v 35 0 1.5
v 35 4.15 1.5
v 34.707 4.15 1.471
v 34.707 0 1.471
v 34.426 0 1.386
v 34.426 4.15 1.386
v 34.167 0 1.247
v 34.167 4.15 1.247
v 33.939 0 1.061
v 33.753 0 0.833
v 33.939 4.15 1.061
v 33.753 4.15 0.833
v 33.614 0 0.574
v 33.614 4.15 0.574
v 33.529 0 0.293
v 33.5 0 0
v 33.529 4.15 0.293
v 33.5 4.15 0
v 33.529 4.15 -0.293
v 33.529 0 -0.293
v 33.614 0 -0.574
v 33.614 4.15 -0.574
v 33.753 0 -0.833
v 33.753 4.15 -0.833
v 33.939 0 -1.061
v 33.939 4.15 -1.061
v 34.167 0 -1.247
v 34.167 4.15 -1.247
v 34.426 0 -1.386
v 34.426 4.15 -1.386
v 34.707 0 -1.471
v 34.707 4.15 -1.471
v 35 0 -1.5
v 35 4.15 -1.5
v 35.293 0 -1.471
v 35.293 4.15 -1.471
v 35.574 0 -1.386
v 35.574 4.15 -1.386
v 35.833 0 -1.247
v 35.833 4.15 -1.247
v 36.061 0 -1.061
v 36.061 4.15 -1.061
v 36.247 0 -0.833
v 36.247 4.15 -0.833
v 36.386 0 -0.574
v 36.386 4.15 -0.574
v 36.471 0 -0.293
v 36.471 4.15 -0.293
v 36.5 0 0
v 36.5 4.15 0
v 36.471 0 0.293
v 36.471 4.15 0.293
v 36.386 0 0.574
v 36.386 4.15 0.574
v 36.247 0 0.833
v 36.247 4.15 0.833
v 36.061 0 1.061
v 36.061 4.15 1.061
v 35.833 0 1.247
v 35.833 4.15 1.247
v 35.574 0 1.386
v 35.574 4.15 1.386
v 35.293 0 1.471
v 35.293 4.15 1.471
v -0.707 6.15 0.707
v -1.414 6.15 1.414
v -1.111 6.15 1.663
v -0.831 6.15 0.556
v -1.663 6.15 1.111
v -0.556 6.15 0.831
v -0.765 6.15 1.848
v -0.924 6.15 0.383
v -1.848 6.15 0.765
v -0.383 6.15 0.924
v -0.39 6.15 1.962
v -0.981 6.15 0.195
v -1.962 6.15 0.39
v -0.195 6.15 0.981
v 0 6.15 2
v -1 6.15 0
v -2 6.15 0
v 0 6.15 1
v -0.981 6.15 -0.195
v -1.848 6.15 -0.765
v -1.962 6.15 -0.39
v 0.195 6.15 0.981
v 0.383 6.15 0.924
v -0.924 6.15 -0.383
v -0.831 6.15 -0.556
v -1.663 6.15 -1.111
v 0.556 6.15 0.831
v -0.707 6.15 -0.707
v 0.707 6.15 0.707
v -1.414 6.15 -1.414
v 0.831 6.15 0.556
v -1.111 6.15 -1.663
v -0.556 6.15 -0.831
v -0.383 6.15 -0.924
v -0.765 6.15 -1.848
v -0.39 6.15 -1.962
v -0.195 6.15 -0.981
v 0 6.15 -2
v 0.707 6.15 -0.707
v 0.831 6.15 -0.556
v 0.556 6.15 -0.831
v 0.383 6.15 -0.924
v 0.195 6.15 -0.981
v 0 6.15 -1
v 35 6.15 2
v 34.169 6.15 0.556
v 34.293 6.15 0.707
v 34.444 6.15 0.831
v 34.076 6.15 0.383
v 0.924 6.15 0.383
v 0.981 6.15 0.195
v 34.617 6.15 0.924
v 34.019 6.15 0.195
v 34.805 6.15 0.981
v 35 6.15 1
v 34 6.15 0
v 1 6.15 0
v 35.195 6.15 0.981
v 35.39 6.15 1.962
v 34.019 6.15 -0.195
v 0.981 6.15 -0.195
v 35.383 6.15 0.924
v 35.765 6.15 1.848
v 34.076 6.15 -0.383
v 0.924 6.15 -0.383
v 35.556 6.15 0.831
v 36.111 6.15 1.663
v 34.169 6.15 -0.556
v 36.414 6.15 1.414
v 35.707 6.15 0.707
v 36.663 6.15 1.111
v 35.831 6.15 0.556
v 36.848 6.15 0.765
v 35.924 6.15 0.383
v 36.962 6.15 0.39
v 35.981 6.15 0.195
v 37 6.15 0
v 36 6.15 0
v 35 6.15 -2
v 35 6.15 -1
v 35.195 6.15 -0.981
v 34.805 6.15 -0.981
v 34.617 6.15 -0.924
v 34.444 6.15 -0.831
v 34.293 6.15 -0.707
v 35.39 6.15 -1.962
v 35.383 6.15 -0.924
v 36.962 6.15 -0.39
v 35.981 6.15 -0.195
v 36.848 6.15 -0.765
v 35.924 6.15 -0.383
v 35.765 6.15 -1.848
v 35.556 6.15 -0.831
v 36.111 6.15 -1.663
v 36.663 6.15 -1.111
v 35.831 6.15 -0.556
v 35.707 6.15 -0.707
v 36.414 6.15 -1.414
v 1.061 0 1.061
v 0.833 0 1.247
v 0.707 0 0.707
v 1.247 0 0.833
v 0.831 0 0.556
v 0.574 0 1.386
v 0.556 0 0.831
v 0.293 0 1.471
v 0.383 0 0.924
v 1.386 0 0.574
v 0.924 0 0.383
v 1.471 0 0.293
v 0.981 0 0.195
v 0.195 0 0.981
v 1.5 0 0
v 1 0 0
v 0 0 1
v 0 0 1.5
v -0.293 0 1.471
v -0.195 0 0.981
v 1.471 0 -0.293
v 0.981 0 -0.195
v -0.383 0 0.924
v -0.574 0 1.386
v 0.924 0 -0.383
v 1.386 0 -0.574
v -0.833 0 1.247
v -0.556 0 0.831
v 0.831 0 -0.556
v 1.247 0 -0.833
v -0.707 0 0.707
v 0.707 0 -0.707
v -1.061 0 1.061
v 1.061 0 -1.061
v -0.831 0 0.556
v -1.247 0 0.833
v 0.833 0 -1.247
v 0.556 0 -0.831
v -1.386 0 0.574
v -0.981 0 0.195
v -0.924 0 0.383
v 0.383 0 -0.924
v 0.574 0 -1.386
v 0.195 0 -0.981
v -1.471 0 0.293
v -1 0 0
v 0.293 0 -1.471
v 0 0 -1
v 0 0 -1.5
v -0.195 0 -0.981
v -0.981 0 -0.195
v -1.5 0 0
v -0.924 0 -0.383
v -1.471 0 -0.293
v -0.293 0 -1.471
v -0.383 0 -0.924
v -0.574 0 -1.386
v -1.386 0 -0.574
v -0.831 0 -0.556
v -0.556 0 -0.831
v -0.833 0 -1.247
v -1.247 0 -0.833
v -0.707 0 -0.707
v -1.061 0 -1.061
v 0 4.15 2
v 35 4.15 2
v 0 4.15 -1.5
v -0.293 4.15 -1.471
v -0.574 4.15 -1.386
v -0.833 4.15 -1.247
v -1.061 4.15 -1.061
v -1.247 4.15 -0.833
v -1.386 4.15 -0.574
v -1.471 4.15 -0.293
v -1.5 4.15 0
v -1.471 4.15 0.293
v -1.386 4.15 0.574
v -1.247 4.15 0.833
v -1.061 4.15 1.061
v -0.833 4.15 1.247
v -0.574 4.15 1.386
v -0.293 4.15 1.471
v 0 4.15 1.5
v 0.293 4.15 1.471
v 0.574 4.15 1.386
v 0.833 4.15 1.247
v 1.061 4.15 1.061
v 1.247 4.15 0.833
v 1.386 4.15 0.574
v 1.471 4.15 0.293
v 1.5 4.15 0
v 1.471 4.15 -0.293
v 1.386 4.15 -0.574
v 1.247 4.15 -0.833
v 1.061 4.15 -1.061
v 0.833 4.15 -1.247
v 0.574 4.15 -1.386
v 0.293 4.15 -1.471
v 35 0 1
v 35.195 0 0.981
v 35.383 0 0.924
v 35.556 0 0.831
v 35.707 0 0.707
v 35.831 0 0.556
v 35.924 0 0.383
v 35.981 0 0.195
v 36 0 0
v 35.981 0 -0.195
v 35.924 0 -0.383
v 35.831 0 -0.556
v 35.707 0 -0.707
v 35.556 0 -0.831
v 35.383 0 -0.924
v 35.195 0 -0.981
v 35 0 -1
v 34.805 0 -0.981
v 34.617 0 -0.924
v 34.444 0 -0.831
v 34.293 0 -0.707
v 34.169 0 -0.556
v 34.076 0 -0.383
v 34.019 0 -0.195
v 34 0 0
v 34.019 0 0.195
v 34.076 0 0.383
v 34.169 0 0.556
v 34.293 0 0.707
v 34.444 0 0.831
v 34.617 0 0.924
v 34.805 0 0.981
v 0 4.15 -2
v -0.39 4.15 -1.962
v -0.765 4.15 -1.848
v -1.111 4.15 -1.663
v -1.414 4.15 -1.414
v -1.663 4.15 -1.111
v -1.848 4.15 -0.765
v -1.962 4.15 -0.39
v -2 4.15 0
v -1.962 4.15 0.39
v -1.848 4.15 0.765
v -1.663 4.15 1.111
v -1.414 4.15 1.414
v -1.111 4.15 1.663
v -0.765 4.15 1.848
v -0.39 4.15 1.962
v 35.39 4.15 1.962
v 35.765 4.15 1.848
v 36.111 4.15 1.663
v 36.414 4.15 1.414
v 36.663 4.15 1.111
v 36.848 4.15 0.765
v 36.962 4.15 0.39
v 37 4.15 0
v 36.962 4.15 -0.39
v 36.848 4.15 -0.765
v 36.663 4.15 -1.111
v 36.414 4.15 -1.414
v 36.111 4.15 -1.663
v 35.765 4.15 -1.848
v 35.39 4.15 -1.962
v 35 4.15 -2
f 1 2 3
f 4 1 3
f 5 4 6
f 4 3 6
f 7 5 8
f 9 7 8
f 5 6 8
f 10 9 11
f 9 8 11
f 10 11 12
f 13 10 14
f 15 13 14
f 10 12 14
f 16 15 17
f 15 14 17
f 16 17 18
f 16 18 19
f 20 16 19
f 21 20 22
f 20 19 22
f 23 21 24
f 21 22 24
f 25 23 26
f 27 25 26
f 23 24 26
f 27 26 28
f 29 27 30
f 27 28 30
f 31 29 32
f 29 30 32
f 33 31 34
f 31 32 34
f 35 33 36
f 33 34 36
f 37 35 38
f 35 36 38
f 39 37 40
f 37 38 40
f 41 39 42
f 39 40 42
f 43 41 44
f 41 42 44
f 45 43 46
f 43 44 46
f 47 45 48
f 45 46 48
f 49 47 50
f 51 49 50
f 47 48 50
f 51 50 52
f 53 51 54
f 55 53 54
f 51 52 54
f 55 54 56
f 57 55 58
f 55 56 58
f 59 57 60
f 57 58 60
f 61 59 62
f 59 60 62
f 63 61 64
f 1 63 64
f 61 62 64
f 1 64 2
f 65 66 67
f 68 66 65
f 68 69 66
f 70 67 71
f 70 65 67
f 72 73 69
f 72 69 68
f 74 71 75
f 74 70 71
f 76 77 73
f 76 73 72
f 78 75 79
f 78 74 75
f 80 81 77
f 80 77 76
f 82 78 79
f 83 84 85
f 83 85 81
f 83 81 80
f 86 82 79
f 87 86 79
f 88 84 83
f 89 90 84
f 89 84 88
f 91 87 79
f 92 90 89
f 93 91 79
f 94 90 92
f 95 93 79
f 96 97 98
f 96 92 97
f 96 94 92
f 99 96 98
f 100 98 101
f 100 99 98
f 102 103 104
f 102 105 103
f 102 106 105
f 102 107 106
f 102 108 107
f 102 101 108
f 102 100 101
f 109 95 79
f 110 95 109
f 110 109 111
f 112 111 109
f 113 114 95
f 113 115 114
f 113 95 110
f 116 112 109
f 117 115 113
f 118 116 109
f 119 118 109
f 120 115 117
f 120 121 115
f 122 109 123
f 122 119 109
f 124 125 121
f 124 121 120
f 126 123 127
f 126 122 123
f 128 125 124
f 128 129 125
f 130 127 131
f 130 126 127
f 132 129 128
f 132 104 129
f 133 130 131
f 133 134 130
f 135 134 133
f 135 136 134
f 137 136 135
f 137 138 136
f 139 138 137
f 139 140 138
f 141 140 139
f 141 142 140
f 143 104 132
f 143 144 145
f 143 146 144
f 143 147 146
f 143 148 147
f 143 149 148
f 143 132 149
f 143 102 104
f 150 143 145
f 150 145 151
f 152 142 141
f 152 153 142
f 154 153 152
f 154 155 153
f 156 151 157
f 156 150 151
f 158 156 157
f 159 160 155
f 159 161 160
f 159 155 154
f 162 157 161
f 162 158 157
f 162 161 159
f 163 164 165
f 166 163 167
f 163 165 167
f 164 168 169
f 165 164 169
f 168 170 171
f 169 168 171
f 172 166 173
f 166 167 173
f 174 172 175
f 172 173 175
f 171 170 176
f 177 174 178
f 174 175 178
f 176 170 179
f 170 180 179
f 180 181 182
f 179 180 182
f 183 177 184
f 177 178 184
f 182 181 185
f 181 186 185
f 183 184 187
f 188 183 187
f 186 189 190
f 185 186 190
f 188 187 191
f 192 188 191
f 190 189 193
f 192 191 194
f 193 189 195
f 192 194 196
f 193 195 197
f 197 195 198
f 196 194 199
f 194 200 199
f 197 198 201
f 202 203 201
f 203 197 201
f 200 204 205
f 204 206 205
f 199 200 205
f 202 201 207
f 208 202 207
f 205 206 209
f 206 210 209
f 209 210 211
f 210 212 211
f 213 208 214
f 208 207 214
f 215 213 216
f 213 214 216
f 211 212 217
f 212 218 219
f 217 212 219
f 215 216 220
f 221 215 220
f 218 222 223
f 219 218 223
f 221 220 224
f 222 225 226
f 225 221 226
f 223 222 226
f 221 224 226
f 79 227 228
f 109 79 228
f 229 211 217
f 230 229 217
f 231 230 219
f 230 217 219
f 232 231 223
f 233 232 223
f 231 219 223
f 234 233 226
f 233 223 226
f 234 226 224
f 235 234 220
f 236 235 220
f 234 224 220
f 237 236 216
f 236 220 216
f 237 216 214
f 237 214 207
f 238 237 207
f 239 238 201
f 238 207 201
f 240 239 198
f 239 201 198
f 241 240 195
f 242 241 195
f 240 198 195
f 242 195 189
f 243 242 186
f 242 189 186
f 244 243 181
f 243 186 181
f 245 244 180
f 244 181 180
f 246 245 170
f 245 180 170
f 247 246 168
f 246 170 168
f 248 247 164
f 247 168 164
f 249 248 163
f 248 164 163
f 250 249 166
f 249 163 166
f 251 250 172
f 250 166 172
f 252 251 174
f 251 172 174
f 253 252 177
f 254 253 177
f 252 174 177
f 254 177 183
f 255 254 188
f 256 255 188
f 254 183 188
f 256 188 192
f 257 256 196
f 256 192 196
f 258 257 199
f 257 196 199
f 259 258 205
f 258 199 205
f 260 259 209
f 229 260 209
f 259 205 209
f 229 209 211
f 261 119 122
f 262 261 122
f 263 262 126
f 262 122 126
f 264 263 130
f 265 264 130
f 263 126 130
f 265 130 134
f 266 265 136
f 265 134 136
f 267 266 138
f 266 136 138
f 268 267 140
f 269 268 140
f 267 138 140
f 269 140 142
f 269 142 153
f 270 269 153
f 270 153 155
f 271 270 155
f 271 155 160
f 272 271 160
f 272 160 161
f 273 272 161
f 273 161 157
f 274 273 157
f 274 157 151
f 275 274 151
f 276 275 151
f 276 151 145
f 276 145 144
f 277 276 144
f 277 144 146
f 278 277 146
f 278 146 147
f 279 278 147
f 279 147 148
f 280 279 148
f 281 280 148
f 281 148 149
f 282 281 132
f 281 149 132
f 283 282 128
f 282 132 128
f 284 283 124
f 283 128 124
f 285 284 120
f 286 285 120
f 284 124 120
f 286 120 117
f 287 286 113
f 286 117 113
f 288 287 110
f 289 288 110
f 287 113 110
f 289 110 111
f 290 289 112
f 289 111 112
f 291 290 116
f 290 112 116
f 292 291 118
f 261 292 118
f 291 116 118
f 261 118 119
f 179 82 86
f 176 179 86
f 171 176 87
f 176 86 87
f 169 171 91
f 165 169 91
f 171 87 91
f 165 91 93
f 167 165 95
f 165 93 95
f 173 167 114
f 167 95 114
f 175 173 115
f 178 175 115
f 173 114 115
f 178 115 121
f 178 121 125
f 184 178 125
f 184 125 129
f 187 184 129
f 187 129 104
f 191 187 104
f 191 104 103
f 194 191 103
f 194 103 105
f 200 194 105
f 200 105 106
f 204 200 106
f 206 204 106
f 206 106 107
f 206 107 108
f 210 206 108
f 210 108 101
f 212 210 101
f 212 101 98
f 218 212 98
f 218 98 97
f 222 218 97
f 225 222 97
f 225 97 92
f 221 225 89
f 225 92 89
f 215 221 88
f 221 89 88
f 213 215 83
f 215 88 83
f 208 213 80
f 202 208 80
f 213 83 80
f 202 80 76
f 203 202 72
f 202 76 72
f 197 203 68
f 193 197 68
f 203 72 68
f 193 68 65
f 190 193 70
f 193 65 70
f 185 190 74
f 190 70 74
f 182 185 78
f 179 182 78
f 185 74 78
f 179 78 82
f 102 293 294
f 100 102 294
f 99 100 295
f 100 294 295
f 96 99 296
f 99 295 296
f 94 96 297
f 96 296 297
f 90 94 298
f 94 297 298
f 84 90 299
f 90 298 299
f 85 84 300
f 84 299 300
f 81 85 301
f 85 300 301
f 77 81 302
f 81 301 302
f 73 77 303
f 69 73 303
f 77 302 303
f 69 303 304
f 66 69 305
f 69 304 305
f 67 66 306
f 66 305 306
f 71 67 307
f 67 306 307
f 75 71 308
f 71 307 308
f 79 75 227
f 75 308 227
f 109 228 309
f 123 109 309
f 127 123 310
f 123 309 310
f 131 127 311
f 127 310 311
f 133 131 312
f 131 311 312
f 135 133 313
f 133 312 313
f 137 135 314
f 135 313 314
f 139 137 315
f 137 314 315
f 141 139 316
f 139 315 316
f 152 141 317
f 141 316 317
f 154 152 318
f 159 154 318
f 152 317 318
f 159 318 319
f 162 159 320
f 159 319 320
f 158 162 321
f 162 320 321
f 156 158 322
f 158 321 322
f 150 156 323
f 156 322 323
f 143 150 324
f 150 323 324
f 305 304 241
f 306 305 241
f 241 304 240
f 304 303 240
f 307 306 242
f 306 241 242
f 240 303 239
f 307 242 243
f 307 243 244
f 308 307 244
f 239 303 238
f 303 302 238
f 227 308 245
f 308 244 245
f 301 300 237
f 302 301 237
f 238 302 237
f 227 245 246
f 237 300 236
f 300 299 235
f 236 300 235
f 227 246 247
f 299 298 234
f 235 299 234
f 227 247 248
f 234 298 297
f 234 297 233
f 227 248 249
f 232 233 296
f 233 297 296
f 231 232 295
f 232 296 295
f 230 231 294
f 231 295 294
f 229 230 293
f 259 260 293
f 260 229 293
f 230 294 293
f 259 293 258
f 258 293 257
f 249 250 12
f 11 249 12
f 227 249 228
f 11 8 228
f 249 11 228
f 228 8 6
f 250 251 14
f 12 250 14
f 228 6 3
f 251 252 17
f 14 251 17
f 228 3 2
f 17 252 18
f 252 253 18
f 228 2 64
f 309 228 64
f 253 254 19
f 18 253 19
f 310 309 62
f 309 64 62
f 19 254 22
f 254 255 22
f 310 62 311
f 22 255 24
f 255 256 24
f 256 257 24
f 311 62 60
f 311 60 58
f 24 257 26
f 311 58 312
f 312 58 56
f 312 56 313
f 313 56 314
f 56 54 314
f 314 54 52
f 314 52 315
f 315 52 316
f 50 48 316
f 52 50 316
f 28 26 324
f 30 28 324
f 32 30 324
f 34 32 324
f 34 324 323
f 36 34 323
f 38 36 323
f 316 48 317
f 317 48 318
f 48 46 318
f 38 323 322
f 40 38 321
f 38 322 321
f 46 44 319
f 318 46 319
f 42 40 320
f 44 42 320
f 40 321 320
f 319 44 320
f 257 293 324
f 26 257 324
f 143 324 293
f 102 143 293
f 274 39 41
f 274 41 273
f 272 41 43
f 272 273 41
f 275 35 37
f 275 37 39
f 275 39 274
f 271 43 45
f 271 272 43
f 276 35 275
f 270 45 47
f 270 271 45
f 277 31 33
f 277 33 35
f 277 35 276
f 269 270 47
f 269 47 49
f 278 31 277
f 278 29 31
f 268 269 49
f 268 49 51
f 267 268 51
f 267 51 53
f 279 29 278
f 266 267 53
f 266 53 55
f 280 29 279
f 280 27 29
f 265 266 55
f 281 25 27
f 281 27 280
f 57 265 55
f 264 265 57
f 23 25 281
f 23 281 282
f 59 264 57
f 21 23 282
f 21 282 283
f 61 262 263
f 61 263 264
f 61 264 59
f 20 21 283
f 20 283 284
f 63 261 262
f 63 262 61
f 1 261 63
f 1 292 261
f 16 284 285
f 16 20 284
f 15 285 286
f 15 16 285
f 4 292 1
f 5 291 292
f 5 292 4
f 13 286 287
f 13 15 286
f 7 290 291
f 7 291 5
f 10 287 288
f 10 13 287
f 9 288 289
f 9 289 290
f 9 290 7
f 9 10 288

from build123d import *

# Parameters (mm, degrees)
SKETCH1_R           = 1.5
BOSS_EXTRUDE1_DEPTH = 4.15
BOSS_EXTRUDE2_DEPTH = 2
SKETCH3_R           = 1.5
BOSS_EXTRUDE3_DEPTH = 4.15
SKETCH4_R           = 1
CUT_EXTRUDE1_DEPTH  = 38.560917188


with BuildPart() as part:
    # Sketch1 → Boss-Extrude1 (new body)
    with BuildSketch(Plane(origin=(0, 0, 0), x_dir=(1, 0, 0), z_dir=(0, 1, 0))):
        with Locations(Location((0, 0, 0), (0, 0, 90))):
            Circle(SKETCH1_R)
    extrude(amount=BOSS_EXTRUDE1_DEPTH)

    # Sketch2 → Boss-Extrude2 (add)
    with BuildSketch(Plane(origin=(0, 4.15, 0), x_dir=(1, 0, 0), z_dir=(0, 1, 0))):
        with BuildLine():
            Line((35, 2), (0, 2))
            ThreePointArc((0, 2), (-2, 0), (0, -2))
            Line((0, -2), (35, -2))
            ThreePointArc((35, -2), (37, 0), (35, 2))
        make_face()
    extrude(amount=BOSS_EXTRUDE2_DEPTH)

    # Sketch3 → Boss-Extrude3 (add)
    with BuildSketch(Plane.XZ.offset(-4.15)):
        with Locations(Location((35, 0, 0), (0, 0, 90))):
            Circle(SKETCH3_R)
    extrude(amount=BOSS_EXTRUDE3_DEPTH)

    # Sketch4 → Cut-Extrude1 (cut, through all)
    with BuildSketch(Plane(origin=(0, 6.15, 0), x_dir=(1, 0, 0), z_dir=(0, 1, 0))):
        with Locations(Location((0, 0, 0), (0, 0, 270))):
            Circle(SKETCH4_R)
        with Locations(Location((35, 0, 0), (0, 0, 270))):
            Circle(SKETCH4_R)
    extrude(amount=-CUT_EXTRUDE1_DEPTH, mode=Mode.SUBTRACT)


solid = part.part
